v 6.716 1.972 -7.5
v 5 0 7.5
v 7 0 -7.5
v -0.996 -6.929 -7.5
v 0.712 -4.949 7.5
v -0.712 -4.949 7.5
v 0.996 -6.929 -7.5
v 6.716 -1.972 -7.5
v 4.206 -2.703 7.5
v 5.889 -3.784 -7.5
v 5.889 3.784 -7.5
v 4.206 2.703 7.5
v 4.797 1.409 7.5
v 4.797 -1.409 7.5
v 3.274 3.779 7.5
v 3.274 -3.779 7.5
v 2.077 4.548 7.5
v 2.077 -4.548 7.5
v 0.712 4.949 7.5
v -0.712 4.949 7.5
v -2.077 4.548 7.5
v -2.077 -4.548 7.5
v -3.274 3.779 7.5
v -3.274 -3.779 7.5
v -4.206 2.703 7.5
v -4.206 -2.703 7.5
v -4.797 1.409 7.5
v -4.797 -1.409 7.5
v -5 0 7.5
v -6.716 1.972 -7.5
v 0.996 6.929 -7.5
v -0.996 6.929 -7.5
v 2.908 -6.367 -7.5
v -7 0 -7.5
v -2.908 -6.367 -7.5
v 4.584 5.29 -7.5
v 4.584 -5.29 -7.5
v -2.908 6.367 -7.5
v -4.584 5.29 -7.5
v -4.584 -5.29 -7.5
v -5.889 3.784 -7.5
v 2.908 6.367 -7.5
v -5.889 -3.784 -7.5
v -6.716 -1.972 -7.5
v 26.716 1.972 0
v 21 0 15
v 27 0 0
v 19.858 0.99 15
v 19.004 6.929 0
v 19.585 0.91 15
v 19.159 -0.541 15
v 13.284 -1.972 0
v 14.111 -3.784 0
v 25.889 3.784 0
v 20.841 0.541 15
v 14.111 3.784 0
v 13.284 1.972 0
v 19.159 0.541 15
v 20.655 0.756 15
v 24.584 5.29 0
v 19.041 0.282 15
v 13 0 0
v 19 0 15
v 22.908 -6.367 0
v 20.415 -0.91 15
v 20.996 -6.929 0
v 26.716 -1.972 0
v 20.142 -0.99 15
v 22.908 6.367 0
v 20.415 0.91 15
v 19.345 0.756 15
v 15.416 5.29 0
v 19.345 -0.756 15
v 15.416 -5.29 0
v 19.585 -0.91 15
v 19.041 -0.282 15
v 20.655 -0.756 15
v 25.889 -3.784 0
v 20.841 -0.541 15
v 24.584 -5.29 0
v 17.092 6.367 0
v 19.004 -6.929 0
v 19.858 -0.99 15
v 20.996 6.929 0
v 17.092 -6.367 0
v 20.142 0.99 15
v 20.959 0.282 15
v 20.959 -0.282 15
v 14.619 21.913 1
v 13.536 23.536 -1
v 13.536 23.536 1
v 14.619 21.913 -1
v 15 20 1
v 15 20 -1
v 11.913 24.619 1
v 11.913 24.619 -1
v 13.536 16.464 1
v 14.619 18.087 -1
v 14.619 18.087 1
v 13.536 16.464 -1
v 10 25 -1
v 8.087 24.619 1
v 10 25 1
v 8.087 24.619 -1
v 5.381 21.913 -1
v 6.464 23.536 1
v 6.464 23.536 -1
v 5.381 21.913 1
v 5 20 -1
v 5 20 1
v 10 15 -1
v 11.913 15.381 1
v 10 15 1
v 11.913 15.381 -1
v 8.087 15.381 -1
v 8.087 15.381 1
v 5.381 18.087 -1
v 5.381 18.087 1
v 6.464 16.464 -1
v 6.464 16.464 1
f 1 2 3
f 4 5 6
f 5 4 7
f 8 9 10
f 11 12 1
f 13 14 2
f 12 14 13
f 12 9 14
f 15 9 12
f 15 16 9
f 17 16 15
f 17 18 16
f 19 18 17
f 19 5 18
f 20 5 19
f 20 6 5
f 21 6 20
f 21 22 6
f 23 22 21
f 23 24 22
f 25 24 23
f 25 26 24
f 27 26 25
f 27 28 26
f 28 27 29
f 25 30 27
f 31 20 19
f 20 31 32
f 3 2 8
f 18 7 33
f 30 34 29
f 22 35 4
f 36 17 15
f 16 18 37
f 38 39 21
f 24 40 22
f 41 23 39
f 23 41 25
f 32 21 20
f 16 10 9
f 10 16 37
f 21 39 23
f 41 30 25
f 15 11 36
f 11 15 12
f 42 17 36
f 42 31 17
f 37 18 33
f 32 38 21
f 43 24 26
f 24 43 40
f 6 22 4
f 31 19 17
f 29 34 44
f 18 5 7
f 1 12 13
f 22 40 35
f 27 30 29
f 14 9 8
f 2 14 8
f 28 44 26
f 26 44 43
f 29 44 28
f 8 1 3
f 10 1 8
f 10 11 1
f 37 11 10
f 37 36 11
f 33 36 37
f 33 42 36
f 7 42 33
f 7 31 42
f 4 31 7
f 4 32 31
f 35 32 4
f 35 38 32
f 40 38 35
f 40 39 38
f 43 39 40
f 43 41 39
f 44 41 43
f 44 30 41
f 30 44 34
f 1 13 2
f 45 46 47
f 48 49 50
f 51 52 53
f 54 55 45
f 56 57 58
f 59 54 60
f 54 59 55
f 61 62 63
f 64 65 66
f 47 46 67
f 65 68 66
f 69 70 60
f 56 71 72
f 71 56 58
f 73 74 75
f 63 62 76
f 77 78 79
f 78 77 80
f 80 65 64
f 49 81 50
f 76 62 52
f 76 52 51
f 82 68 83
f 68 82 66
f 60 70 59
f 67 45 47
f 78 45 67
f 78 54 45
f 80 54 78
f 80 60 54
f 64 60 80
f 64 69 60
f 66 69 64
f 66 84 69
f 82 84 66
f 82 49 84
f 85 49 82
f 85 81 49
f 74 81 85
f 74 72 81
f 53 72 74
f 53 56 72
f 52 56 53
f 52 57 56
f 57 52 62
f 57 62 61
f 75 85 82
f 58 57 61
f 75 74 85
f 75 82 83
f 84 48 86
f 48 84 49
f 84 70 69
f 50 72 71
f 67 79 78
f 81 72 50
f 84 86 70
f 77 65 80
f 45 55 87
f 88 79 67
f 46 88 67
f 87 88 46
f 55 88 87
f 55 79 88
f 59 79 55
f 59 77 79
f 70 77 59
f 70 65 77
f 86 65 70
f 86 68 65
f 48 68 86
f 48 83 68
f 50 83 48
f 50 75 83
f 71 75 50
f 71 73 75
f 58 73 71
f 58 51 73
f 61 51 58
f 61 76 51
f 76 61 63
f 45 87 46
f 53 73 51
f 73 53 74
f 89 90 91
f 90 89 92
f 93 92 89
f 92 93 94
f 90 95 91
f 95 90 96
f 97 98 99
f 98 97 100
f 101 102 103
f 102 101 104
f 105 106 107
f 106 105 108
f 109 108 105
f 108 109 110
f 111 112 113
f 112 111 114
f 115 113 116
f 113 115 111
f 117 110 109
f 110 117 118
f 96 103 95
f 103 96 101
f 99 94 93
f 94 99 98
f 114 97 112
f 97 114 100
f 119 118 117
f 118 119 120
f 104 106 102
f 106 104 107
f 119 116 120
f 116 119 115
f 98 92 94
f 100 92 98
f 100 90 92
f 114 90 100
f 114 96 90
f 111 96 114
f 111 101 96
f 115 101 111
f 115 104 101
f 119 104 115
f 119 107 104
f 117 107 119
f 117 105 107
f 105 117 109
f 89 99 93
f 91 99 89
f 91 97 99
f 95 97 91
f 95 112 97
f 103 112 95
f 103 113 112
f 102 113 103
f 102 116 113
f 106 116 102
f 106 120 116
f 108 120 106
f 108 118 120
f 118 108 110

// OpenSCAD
color("red") cylinder(15, 7, 5, center=true);
color("blue") translate([20, 0, 0]) cylinder(15, 7);

color("green") translate([10, 20, 0]) cylinder(2, d=10, center=true);
